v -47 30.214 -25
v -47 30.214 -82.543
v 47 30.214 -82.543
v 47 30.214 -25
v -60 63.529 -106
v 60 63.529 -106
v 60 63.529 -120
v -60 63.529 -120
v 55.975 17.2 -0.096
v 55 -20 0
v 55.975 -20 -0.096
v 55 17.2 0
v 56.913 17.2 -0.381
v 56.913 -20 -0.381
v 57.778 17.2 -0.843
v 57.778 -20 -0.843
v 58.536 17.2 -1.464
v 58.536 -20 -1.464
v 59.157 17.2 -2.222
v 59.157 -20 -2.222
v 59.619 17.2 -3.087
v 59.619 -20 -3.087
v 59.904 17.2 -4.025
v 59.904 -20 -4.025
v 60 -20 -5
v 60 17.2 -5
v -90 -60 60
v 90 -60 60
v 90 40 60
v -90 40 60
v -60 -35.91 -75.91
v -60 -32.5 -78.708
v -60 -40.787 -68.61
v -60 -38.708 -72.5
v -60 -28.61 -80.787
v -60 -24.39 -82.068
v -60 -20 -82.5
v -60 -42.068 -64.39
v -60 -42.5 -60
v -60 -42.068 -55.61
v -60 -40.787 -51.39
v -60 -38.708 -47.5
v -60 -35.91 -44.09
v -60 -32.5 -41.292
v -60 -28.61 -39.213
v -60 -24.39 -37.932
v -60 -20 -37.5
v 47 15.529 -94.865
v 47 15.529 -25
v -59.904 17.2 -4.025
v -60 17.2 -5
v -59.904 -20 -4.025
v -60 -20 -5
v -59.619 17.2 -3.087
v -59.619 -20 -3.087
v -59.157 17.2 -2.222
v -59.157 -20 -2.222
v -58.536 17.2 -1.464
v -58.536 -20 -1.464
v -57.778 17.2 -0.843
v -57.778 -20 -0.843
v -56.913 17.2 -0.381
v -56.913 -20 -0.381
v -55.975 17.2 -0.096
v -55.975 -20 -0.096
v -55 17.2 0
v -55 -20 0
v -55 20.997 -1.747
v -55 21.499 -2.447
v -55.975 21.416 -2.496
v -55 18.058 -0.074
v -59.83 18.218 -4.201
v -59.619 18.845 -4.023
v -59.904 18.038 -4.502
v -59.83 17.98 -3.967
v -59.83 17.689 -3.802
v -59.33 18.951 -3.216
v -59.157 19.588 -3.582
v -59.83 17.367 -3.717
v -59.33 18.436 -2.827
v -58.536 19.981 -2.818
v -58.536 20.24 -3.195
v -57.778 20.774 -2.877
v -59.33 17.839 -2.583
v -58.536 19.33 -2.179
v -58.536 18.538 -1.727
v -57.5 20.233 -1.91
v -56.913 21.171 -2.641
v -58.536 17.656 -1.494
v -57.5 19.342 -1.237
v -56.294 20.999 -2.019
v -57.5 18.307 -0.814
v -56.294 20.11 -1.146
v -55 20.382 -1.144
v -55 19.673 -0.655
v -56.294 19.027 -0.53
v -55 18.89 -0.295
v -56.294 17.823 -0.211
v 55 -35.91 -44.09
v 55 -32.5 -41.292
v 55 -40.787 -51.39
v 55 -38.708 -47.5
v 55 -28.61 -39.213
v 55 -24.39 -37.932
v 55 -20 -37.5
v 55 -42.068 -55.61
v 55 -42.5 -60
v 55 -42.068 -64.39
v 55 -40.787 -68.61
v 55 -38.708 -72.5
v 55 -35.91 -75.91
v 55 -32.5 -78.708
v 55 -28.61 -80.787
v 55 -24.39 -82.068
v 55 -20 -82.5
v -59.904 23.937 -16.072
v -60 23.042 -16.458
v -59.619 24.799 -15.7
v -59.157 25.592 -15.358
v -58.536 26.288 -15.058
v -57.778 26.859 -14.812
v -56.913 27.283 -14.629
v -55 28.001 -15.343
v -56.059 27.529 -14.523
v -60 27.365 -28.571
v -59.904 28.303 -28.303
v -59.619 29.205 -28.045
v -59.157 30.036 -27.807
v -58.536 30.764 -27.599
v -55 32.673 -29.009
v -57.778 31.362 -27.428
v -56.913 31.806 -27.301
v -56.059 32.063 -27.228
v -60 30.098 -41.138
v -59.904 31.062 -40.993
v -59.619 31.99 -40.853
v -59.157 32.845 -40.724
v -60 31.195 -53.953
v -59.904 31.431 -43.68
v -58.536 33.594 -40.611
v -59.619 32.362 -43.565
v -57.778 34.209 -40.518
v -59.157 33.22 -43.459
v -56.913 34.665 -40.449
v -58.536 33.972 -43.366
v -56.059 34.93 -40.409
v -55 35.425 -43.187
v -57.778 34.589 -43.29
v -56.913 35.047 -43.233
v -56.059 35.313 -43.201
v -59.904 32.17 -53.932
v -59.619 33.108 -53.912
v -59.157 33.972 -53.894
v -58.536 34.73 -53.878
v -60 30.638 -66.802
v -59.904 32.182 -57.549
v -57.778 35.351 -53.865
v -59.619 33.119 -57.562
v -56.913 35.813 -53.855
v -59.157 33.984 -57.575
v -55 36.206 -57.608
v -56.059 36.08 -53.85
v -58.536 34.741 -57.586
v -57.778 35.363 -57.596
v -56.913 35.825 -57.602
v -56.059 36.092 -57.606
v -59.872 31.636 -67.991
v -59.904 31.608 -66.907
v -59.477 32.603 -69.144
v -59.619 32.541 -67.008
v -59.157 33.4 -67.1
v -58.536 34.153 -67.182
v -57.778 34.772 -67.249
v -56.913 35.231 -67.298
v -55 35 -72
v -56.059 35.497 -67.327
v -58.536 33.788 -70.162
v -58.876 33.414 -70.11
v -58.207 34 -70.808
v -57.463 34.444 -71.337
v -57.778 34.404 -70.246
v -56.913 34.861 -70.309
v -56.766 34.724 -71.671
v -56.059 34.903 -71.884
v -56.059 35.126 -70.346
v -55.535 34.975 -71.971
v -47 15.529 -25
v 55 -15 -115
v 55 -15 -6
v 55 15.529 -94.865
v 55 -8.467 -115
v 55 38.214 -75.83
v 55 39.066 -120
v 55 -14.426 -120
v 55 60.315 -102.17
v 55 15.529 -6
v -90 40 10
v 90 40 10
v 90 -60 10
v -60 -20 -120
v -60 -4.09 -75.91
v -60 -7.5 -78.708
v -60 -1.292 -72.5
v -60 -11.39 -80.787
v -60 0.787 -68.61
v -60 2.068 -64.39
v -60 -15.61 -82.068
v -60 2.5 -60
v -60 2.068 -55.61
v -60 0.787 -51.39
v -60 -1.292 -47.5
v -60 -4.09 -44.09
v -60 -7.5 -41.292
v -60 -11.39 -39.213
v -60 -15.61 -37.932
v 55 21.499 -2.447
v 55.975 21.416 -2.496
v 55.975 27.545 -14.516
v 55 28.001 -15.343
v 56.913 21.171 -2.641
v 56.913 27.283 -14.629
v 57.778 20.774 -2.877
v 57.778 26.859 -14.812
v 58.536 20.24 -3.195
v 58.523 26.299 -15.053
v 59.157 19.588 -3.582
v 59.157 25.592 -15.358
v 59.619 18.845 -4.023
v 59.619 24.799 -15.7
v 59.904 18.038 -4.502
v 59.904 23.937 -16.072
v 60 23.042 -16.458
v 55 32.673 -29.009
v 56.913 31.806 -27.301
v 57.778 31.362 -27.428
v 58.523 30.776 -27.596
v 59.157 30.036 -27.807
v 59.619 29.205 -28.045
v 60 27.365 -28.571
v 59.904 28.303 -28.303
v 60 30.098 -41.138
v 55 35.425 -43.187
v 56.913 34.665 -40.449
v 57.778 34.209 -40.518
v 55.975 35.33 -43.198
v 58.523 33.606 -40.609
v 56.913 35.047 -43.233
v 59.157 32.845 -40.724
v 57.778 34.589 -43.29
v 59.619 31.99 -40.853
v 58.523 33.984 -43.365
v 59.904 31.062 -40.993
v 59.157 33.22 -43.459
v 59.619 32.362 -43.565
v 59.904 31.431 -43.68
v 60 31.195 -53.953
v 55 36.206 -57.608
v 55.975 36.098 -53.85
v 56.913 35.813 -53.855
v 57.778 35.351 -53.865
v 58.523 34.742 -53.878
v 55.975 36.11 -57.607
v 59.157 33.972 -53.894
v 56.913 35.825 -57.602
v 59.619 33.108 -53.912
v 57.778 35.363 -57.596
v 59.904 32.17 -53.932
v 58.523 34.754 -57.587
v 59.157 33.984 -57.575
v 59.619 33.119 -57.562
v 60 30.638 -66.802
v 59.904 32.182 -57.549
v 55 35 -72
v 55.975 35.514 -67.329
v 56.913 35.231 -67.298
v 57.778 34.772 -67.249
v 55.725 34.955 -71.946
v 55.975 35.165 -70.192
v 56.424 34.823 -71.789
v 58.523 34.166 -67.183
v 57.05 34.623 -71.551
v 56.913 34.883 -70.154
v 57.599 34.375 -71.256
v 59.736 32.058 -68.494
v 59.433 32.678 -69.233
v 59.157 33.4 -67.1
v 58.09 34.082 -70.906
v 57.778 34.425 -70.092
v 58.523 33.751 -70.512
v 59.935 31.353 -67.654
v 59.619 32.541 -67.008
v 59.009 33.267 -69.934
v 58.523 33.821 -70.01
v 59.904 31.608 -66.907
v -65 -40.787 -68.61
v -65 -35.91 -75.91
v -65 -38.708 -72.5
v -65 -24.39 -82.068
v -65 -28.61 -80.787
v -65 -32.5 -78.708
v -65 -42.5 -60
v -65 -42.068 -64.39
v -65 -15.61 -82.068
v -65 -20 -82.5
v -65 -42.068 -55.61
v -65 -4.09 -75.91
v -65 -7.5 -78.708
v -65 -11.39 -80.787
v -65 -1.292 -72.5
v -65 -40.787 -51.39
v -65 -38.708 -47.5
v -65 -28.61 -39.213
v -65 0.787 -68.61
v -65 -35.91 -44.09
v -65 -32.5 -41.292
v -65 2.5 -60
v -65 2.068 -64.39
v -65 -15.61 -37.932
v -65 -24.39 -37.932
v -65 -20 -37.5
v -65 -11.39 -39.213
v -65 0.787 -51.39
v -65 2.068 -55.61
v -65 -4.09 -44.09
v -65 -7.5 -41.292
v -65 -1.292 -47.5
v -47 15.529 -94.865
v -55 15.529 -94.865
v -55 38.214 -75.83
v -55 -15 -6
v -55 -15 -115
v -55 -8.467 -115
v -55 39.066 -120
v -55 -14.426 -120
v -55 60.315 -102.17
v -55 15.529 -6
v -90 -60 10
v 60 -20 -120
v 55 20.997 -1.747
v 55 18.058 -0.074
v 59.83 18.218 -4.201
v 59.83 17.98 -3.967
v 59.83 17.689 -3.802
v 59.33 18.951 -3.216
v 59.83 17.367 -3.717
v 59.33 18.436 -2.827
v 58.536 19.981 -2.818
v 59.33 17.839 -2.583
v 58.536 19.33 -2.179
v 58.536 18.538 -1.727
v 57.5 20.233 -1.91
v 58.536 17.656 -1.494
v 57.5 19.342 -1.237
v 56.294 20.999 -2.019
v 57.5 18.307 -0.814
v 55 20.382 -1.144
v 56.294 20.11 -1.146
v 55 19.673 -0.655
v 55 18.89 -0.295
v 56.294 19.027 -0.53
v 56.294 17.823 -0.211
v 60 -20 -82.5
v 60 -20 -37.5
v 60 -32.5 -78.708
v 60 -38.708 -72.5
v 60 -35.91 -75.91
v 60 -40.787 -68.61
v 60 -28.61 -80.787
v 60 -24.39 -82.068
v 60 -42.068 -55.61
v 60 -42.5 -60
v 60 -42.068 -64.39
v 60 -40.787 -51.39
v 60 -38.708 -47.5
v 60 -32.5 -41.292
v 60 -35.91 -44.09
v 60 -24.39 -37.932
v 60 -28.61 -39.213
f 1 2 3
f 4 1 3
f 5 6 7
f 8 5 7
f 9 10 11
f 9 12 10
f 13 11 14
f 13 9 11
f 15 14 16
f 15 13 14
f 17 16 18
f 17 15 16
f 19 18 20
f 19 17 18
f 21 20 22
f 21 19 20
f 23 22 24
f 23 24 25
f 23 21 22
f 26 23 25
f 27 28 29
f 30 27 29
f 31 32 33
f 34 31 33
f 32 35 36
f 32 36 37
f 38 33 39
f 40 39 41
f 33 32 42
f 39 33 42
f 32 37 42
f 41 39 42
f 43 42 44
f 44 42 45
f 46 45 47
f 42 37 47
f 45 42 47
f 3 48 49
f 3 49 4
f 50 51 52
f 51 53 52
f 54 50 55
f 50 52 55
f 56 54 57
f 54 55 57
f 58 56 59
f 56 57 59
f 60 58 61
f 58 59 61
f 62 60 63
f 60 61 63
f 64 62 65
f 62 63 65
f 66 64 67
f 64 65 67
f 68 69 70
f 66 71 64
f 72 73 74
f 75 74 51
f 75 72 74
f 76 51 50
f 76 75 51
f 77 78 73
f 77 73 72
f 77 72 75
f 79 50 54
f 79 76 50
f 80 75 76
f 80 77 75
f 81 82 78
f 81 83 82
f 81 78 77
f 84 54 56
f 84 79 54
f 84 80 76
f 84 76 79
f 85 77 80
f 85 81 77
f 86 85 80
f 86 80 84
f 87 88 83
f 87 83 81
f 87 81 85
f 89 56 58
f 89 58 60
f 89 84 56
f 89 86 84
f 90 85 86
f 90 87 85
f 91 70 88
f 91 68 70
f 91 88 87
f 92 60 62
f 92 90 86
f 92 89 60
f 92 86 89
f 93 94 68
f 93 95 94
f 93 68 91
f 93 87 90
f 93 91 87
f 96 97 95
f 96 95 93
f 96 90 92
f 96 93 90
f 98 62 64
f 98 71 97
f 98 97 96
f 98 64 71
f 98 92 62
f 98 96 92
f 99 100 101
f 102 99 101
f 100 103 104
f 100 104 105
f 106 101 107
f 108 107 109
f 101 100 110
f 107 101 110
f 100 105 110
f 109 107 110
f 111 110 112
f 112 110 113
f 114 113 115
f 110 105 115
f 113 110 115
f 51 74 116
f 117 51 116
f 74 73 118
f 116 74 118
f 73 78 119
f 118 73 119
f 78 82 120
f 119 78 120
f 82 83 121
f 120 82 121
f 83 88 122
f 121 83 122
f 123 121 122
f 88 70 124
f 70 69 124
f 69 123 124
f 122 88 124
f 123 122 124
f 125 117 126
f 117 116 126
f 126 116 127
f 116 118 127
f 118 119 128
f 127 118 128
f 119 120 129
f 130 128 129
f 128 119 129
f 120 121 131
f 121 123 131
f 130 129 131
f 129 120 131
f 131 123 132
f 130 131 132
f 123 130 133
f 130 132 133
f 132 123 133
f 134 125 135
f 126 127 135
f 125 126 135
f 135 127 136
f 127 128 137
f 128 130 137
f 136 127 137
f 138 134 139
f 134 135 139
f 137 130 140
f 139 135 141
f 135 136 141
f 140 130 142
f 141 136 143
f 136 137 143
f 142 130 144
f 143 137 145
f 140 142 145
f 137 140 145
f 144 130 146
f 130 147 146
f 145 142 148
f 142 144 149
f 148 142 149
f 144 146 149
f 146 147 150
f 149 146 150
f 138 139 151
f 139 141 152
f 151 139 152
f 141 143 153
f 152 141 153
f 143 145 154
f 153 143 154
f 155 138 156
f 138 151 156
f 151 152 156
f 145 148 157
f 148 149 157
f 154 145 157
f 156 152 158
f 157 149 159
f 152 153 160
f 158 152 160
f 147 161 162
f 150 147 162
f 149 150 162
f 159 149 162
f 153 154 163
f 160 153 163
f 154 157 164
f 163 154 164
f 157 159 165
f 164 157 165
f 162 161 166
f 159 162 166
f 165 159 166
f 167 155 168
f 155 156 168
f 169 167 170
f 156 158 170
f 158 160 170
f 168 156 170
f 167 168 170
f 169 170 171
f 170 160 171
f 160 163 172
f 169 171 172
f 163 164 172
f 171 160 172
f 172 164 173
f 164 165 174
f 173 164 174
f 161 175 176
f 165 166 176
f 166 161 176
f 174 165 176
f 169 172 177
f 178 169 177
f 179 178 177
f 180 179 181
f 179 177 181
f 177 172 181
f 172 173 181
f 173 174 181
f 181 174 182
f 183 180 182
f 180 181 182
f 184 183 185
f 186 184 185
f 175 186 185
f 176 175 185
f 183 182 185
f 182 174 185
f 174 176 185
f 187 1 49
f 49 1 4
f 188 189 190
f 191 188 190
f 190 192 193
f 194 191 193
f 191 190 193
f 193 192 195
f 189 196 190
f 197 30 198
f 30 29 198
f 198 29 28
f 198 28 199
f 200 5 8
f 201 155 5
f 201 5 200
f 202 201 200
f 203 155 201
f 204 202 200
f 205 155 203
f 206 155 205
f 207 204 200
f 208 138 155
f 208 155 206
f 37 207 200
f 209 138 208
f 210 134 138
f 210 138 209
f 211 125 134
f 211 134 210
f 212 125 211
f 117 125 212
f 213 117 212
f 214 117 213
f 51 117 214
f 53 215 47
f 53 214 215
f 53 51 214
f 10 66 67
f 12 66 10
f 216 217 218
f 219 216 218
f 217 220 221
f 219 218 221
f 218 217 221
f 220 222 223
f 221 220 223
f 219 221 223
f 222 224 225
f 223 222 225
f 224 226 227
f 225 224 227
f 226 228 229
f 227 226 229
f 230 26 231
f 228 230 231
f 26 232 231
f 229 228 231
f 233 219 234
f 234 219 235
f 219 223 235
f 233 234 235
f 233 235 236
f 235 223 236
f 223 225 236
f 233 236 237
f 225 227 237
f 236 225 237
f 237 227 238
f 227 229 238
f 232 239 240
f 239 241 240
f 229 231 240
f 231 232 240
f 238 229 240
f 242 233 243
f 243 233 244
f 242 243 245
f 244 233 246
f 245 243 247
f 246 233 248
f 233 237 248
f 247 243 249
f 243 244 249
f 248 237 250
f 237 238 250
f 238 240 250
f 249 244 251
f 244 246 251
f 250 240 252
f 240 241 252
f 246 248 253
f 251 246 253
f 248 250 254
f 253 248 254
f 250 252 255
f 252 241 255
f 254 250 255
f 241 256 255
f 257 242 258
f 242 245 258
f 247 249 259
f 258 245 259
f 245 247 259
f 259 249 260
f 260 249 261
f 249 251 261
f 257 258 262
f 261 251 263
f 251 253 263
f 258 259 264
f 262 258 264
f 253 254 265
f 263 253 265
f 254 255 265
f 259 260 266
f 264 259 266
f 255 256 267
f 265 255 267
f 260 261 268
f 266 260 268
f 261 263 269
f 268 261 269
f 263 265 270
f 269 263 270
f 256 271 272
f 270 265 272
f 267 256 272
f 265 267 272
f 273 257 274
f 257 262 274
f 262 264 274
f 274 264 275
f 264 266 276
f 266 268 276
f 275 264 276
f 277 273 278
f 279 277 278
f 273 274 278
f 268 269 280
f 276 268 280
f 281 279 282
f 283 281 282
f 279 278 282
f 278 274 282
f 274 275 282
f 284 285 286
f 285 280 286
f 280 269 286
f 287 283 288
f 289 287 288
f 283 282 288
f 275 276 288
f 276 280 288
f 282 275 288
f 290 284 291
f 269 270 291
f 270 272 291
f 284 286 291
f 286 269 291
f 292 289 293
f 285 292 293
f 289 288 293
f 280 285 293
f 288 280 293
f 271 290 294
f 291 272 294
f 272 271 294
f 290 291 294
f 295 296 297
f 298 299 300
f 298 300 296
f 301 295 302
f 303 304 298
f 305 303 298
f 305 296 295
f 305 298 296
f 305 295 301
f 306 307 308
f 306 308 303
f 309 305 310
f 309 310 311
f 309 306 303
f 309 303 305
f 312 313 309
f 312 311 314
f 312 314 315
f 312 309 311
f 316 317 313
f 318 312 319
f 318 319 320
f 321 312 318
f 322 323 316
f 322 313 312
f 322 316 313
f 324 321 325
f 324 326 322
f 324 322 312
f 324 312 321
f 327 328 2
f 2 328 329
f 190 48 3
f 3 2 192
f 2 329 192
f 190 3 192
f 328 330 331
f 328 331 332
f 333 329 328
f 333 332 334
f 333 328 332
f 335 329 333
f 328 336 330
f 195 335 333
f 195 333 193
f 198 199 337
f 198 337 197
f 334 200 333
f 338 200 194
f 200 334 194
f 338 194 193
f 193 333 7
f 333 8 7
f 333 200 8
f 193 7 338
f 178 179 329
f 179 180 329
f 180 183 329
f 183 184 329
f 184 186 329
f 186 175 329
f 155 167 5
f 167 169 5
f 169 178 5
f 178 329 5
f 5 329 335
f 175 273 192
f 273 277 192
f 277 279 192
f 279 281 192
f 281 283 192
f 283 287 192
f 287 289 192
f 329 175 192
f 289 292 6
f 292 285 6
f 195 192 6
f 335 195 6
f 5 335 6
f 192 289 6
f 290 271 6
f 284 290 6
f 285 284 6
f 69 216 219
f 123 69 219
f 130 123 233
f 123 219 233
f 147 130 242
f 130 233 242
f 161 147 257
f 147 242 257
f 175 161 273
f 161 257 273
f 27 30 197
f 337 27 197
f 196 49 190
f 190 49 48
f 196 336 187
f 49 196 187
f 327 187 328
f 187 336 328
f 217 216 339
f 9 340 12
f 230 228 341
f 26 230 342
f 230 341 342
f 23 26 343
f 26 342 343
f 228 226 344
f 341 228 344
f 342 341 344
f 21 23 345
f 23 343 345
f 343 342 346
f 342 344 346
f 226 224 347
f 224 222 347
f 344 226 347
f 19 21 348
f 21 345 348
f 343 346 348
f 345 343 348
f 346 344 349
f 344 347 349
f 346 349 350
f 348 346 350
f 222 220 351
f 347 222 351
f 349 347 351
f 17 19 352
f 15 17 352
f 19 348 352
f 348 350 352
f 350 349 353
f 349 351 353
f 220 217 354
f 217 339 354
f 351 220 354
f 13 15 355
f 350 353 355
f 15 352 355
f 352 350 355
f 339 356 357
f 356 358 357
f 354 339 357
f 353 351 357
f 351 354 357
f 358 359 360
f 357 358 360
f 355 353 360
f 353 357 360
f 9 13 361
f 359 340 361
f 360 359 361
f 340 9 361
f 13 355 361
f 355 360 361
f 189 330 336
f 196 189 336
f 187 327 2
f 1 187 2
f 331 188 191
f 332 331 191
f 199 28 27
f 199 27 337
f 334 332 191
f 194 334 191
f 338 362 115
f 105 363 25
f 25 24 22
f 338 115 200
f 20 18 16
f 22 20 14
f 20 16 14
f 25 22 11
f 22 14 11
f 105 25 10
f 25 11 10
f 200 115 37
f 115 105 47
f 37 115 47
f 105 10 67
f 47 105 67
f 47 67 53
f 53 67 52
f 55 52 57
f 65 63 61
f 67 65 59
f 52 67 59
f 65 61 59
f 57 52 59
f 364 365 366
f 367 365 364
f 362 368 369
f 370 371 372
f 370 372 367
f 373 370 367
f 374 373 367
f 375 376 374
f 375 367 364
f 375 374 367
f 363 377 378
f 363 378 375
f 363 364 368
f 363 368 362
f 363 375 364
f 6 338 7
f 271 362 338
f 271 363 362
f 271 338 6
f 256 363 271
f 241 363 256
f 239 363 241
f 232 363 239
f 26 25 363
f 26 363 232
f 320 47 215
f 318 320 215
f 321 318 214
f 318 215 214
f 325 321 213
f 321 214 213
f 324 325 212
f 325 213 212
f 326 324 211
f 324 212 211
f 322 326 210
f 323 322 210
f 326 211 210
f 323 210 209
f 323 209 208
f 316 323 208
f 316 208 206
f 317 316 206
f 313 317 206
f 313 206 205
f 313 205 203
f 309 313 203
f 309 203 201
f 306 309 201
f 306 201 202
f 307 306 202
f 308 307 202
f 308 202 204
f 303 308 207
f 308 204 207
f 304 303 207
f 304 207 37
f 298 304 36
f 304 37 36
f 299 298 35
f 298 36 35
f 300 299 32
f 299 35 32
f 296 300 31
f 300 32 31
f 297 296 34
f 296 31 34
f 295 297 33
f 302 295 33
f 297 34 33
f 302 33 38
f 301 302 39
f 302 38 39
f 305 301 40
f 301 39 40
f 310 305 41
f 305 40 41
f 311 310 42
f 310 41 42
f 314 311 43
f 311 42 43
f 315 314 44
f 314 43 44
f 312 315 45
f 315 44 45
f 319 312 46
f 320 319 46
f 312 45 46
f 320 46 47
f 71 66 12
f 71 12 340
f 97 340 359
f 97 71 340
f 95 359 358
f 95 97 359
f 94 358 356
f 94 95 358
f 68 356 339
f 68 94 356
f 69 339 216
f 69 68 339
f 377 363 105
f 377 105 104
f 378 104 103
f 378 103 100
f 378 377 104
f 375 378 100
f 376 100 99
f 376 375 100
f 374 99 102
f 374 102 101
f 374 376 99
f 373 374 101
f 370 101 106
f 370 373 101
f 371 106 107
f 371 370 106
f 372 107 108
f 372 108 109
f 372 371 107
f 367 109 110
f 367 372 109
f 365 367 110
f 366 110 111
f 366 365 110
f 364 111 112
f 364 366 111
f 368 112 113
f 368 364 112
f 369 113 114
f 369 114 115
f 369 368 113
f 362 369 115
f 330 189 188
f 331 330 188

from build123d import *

# Parameters (mm, degrees)
IZIM1_W                          = 120
IZIM1_H                          = 45
Y_KSEKLIK_EKSTR_ZYON1_DEPTH      = 120
KES_EKSTR_ZYON1_DEPTH            = 120
IZIM3_W                          = 110
IZIM3_H                          = 34.383847837
KES_EKSTR_ZYON2_DEPTH            = 120
IZIM4_W                          = 109
IZIM4_H                          = 30.52938746
KES_EKSTR_ZYON3_DEPTH            = 55
KES_EKSTR_ZYON3_DEPTH_BACK       = 55
IZIM5_W                          = 94
IZIM5_H                          = 38.213938048
KES_EKSTR_ZYON4_DEPTH            = 95
IZIM6_R                          = 22.5
Y_KSEKLIK_EKSTR_ZYON2_DEPTH      = 5
IZIM7_R                          = 22.5
Y_KSEKLIK_EKSTR_ZYON3_DEPTH      = 5
RADYUS1_R                        = 5
IZIM8_W                          = 50
IZIM8_H                          = 100
Y_KSEKLIK_EKSTR_ZYON4_DEPTH      = 90
Y_KSEKLIK_EKSTR_ZYON4_DEPTH_BACK = 90


with BuildPart() as part:
    # Çizim1 → Yükseklik-Ekstrüzyon1 (new body)
    with BuildSketch(Plane.XY):
        with Locations((0, 52.5)):
            Rectangle(IZIM1_W, IZIM1_H)
        Polygon((-60, -20), (-60, 0), (-60, 30), (60, 30), (60, -20), align=None)
    extrude(amount=-Y_KSEKLIK_EKSTR_ZYON1_DEPTH)

    # Çizim2 → Kes-Ekstrüzyon1 (cut)
    with BuildSketch(Plane(origin=(60, 0, 0), x_dir=(0, 0, -1), z_dir=(1, 0, 0))):
        with BuildLine():
            Line((0, 75), (0, 20))
            ThreePointArc((0, 20), (34.643732724, 34.010082923), (72, 35))
            Line((72, 35), (106, 63.52938746))
            Line((106, 63.52938746), (120, 63.52938746))
            Line((120, 63.52938746), (120, 75))
            Line((120, 75), (0, 75))
        make_face()
    extrude(amount=-KES_EKSTR_ZYON1_DEPTH, mode=Mode.SUBTRACT)

    # Çizim3 → Kes-Ekstrüzyon2 (cut)
    with BuildSketch(Plane(origin=(0, -14.914235999, -12.514529926), x_dir=(1, 0, 0), z_dir=(0, 0.766044443, 0.64278761))):
        with Locations((0, 99.844690163)):
            Rectangle(IZIM3_W, IZIM3_H)
    extrude(amount=-KES_EKSTR_ZYON2_DEPTH, mode=Mode.SUBTRACT)

    # Çizim4 → Kes-Ekstrüzyon3 (cut, two sides)
    with BuildSketch(Plane(origin=(0, 0, 0), x_dir=(0, 0, -1), z_dir=(1, 0, 0))) as kes_ekstr_zyon3_sk:
        with Locations((60.5, 0.26469373)):
            Rectangle(IZIM4_W, IZIM4_H)
    extrude(amount=KES_EKSTR_ZYON3_DEPTH, mode=Mode.SUBTRACT)
    extrude(kes_ekstr_zyon3_sk.sketch, amount=-KES_EKSTR_ZYON3_DEPTH_BACK, mode=Mode.SUBTRACT)

    # Çizim5 → Kes-Ekstrüzyon4 (cut)
    with BuildSketch(Plane.XY.offset(-120)):
        with Locations((0, 11.106969024)):
            Rectangle(IZIM5_W, IZIM5_H)
    extrude(amount=KES_EKSTR_ZYON4_DEPTH, mode=Mode.SUBTRACT)

    # Çizim6 → Yükseklik-Ekstrüzyon2 (add)
    with BuildSketch(Plane(origin=(60, 0, 0), x_dir=(0, 0, -1), z_dir=(1, 0, 0))):
        with Locations((60, -20)):
            Circle(IZIM6_R)
    extrude(amount=-Y_KSEKLIK_EKSTR_ZYON2_DEPTH)

    # Çizim7 → Yükseklik-Ekstrüzyon3 (add)
    with BuildSketch(Plane.ZY.offset(60)):
        with Locations((-60, -20)):
            Circle(IZIM7_R)
    extrude(amount=Y_KSEKLIK_EKSTR_ZYON3_DEPTH)

    # Radyus1
    radyus1_edges = [part.edges().sort_by_distance(p)[0] for p in [
        (60, 0, 0),
        (0, 20, 0),
        (-60, 34.010082923, -34.643732724),
        (60, 34.010082923, -34.643732724),
        (-60, 0, 0),
    ]]
    fillet(radyus1_edges, radius=RADYUS1_R)


with BuildPart() as body_2:
    # Çizim8 → Yükseklik-Ekstrüzyon4 (new body, two sides)
    with BuildSketch(Plane(origin=(0, 0, 0), x_dir=(0, 0, -1), z_dir=(1, 0, 0))) as y_kseklik_ekstr_zyon4_sk:
        with Locations((-35, -10)):
            Rectangle(IZIM8_W, IZIM8_H)
    extrude(amount=Y_KSEKLIK_EKSTR_ZYON4_DEPTH)
    extrude(y_kseklik_ekstr_zyon4_sk.sketch, amount=-Y_KSEKLIK_EKSTR_ZYON4_DEPTH_BACK)


solid = Compound([part.part, body_2.part])
